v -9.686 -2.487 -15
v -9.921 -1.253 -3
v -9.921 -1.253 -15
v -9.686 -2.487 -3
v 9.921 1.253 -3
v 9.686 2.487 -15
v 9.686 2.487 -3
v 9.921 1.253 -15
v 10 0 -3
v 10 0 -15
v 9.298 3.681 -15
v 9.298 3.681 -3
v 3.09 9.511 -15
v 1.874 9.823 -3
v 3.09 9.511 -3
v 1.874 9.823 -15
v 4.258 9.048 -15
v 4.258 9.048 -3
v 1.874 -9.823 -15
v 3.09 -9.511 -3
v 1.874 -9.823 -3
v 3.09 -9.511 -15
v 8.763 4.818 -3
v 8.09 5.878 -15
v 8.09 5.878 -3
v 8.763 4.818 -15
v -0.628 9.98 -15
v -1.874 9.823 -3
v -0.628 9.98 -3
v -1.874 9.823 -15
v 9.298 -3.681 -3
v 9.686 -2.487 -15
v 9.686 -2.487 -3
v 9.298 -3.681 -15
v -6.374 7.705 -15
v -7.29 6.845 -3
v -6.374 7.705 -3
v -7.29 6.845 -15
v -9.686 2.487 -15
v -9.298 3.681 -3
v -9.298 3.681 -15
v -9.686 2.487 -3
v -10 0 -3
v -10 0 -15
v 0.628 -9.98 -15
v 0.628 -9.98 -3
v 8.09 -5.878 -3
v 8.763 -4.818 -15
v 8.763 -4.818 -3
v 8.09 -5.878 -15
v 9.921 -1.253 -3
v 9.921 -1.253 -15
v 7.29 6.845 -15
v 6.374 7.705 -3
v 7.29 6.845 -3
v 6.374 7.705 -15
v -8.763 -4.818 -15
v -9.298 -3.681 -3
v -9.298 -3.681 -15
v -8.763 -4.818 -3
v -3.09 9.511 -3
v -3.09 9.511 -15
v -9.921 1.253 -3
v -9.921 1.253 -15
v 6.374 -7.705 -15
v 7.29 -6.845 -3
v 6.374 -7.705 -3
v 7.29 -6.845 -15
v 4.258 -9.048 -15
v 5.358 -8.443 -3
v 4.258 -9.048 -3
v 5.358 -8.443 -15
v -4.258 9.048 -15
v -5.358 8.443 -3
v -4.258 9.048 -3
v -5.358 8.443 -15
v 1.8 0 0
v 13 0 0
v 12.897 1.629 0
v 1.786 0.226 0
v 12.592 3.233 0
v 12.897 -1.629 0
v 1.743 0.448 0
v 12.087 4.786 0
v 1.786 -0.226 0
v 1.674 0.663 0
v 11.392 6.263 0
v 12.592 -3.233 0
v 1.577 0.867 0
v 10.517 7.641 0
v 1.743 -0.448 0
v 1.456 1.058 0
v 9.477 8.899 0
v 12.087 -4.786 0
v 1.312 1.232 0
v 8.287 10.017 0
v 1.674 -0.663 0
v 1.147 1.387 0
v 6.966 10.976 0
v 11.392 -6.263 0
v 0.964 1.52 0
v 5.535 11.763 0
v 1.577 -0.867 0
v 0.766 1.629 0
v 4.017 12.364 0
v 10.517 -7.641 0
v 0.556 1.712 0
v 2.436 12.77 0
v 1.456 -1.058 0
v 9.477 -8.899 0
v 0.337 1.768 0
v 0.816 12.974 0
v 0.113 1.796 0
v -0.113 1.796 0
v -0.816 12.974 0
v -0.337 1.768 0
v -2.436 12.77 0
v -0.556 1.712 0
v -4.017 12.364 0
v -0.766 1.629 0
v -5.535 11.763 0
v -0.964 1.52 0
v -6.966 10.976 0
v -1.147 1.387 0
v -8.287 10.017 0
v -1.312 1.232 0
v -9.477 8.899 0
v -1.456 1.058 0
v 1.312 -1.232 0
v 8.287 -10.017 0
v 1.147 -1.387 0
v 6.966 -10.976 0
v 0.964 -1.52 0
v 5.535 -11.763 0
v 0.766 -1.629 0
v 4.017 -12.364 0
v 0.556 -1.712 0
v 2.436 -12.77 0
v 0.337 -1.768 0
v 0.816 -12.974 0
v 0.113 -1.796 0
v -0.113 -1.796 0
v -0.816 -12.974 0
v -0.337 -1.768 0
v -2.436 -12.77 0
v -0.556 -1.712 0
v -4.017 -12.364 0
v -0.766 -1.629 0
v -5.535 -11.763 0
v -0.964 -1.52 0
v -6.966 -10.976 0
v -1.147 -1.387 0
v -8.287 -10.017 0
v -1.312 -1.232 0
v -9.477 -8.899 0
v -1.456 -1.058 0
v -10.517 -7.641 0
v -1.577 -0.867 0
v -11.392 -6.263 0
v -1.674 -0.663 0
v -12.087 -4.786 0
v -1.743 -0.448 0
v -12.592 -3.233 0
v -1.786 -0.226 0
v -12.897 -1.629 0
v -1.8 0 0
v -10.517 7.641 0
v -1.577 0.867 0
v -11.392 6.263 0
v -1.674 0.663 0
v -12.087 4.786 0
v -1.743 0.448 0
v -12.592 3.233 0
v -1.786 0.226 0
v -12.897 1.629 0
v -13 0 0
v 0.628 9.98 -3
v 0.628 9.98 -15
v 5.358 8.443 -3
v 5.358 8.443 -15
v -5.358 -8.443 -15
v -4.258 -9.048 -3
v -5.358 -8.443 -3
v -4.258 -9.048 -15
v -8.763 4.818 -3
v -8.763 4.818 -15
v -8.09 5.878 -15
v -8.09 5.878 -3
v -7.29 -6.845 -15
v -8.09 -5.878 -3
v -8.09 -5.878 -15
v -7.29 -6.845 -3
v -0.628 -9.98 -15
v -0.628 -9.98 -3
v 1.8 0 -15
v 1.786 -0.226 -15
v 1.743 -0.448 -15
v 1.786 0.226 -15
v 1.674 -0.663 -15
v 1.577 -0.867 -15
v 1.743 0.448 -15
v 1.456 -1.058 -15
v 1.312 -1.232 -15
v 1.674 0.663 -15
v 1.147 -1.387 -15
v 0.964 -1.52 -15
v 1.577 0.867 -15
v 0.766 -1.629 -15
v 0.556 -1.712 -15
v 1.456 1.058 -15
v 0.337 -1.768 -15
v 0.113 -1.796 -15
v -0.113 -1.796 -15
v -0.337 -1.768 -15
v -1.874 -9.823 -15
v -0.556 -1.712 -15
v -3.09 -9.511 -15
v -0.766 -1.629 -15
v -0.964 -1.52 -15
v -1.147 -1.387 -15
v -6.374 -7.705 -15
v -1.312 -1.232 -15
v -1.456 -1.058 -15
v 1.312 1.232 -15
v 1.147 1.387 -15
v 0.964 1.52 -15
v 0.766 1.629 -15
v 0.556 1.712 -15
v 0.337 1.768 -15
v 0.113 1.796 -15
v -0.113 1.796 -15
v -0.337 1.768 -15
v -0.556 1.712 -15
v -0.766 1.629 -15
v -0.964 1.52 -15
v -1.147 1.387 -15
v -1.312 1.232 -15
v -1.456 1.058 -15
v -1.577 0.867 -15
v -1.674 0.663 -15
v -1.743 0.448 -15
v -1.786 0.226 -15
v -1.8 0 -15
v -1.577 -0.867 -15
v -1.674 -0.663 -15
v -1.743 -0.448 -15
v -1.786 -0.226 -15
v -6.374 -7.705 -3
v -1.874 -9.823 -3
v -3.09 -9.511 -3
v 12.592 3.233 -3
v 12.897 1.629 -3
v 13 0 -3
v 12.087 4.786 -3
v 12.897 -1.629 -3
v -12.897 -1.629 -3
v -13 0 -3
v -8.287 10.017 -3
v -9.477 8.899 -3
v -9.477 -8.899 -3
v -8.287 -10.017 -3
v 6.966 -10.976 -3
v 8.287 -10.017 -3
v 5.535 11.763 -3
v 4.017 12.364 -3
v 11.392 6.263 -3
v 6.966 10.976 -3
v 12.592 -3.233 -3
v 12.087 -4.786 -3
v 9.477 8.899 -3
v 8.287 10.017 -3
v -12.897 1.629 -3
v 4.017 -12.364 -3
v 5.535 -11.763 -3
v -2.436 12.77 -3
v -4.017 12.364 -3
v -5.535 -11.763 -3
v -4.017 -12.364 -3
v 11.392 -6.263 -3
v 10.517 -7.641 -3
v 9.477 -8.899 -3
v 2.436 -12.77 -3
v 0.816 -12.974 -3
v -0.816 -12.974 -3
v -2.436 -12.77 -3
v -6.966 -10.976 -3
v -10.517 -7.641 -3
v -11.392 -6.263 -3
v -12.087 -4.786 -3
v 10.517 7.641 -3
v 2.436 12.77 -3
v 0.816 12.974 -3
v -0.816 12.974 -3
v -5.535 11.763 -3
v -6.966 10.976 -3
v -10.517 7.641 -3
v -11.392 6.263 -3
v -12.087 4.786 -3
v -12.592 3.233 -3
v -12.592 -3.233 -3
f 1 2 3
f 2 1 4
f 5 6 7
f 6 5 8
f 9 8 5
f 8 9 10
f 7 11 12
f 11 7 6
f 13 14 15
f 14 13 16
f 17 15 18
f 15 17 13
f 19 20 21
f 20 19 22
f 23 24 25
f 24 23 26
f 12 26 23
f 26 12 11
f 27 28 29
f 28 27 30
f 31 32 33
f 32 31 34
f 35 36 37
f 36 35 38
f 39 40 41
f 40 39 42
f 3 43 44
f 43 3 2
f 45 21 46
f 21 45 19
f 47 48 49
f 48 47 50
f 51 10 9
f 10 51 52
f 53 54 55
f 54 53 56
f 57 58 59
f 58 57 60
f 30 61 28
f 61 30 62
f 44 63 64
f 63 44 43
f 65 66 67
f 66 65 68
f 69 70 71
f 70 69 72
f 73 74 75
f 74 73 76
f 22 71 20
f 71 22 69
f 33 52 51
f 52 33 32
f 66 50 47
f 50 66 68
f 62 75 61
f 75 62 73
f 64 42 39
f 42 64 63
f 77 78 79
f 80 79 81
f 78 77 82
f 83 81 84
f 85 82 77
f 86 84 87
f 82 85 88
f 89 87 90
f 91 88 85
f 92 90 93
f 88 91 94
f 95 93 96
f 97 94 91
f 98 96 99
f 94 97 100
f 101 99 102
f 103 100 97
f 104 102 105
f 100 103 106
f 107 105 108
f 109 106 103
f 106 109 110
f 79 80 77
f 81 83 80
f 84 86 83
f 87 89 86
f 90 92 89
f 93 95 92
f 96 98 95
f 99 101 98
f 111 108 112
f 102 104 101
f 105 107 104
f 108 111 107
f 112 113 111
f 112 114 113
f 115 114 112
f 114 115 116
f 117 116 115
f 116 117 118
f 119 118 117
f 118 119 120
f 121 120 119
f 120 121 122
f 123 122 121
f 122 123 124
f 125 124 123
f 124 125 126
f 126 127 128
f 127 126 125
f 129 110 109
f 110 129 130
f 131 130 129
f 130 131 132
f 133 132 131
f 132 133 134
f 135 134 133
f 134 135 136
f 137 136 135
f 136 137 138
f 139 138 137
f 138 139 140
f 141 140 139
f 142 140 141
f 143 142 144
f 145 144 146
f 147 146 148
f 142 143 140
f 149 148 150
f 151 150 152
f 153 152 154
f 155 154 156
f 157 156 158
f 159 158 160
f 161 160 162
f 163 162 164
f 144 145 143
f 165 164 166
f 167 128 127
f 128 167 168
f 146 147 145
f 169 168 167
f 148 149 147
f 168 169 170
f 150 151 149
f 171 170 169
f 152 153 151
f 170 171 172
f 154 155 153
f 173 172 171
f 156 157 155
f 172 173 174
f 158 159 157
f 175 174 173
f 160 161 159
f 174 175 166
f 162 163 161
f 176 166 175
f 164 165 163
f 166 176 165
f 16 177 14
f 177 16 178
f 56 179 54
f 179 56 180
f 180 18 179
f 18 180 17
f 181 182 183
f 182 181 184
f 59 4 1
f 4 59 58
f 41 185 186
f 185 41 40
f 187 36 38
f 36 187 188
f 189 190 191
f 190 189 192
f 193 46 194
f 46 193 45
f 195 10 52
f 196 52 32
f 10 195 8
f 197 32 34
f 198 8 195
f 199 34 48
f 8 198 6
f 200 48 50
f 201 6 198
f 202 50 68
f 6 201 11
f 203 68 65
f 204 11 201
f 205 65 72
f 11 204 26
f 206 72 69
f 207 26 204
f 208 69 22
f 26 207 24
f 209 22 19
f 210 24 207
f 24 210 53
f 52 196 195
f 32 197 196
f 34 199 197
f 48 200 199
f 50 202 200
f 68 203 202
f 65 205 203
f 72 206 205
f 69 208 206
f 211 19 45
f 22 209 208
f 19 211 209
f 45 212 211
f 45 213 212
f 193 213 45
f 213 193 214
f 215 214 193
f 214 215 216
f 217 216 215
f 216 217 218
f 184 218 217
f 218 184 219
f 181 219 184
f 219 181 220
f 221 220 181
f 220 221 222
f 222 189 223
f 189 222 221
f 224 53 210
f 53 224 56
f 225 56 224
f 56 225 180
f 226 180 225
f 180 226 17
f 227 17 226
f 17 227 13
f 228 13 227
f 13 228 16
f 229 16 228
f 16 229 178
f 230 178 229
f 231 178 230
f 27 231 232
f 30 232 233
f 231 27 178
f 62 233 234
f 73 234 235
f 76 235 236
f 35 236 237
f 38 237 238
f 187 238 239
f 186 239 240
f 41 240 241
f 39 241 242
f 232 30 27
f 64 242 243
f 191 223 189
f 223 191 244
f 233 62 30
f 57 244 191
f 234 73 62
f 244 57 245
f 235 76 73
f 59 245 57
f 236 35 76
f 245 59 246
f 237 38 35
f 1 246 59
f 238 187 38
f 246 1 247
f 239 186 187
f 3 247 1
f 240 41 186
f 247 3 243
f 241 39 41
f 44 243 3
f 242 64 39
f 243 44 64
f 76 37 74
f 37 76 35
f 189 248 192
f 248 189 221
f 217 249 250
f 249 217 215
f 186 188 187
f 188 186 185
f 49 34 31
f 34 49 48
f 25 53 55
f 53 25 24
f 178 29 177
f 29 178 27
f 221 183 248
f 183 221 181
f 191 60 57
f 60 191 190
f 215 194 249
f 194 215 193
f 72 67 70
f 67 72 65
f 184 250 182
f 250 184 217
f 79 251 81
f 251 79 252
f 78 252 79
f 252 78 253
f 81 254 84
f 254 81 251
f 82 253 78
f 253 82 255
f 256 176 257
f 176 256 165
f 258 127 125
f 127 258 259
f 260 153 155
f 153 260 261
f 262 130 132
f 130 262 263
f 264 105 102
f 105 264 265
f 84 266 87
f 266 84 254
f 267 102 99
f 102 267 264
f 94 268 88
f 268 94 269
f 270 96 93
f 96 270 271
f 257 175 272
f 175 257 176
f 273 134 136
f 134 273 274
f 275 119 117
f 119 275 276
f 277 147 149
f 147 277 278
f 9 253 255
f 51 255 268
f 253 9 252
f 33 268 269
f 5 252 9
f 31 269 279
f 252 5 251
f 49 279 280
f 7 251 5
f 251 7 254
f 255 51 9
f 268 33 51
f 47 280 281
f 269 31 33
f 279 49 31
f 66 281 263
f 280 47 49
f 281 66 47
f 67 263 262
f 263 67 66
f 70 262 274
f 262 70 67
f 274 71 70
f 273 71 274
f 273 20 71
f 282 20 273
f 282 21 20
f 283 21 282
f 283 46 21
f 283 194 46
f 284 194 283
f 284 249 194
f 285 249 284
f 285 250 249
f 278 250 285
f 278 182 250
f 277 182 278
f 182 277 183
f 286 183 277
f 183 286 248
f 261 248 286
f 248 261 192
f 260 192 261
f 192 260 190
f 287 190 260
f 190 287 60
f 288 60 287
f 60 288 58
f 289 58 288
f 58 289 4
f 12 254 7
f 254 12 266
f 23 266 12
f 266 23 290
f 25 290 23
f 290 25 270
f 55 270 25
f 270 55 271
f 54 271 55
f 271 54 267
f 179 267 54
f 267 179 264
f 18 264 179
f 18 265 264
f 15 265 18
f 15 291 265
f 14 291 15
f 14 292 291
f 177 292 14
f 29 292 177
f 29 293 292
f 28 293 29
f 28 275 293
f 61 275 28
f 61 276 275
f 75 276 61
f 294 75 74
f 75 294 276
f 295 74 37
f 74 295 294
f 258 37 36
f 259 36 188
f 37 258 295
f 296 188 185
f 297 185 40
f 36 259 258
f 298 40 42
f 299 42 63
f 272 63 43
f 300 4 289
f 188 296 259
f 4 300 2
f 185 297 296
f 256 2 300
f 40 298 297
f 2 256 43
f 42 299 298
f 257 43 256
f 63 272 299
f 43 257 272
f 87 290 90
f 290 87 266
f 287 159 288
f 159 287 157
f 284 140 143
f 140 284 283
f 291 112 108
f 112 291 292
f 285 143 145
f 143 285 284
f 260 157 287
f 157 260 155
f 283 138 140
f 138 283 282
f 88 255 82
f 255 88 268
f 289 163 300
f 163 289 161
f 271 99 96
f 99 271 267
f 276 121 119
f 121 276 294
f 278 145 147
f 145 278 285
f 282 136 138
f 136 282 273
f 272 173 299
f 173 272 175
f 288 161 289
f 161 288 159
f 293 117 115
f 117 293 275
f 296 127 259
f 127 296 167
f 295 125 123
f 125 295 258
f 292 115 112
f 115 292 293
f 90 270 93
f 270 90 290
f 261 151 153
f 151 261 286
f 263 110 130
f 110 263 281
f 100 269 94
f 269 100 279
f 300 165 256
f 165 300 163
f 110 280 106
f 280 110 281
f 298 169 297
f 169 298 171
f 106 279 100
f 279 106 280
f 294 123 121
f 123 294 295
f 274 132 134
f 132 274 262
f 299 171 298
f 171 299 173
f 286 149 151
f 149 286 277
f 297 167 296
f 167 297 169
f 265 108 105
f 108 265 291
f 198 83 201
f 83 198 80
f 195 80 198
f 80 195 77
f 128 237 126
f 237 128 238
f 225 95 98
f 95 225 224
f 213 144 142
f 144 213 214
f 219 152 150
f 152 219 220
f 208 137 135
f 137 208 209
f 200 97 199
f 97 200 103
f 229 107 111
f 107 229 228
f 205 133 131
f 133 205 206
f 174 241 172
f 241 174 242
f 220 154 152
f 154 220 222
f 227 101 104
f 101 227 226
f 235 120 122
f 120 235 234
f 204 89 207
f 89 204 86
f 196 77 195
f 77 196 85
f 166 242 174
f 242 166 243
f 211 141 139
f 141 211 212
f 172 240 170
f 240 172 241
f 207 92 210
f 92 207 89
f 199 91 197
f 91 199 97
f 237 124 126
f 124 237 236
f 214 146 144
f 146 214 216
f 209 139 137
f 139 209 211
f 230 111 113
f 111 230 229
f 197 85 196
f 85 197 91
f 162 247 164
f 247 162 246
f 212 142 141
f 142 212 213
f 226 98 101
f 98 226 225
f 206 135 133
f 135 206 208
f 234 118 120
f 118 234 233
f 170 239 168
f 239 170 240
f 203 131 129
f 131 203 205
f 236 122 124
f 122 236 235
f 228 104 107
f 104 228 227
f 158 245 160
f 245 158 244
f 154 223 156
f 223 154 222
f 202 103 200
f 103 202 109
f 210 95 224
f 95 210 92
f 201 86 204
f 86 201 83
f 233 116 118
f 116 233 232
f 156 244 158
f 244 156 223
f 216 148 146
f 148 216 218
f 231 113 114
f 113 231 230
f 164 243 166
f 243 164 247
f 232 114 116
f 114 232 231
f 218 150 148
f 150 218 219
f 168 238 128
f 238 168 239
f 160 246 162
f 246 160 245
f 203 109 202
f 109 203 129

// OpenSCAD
$fn = 50;


difference() {
	union() {
		translate(v = [0, 0, -15.0000000000]) {
			cylinder(h = 15, r = 10.0000000000);
		}
		translate(v = [0, 0, -3.0000000000]) {
			cylinder(h = 3, r = 13.0000000000);
		}
	}
	union() {
		#translate(v = [0, 0, -15]) {
			cylinder(h = 15, r = 1.8000000000);
		}
	}
}
